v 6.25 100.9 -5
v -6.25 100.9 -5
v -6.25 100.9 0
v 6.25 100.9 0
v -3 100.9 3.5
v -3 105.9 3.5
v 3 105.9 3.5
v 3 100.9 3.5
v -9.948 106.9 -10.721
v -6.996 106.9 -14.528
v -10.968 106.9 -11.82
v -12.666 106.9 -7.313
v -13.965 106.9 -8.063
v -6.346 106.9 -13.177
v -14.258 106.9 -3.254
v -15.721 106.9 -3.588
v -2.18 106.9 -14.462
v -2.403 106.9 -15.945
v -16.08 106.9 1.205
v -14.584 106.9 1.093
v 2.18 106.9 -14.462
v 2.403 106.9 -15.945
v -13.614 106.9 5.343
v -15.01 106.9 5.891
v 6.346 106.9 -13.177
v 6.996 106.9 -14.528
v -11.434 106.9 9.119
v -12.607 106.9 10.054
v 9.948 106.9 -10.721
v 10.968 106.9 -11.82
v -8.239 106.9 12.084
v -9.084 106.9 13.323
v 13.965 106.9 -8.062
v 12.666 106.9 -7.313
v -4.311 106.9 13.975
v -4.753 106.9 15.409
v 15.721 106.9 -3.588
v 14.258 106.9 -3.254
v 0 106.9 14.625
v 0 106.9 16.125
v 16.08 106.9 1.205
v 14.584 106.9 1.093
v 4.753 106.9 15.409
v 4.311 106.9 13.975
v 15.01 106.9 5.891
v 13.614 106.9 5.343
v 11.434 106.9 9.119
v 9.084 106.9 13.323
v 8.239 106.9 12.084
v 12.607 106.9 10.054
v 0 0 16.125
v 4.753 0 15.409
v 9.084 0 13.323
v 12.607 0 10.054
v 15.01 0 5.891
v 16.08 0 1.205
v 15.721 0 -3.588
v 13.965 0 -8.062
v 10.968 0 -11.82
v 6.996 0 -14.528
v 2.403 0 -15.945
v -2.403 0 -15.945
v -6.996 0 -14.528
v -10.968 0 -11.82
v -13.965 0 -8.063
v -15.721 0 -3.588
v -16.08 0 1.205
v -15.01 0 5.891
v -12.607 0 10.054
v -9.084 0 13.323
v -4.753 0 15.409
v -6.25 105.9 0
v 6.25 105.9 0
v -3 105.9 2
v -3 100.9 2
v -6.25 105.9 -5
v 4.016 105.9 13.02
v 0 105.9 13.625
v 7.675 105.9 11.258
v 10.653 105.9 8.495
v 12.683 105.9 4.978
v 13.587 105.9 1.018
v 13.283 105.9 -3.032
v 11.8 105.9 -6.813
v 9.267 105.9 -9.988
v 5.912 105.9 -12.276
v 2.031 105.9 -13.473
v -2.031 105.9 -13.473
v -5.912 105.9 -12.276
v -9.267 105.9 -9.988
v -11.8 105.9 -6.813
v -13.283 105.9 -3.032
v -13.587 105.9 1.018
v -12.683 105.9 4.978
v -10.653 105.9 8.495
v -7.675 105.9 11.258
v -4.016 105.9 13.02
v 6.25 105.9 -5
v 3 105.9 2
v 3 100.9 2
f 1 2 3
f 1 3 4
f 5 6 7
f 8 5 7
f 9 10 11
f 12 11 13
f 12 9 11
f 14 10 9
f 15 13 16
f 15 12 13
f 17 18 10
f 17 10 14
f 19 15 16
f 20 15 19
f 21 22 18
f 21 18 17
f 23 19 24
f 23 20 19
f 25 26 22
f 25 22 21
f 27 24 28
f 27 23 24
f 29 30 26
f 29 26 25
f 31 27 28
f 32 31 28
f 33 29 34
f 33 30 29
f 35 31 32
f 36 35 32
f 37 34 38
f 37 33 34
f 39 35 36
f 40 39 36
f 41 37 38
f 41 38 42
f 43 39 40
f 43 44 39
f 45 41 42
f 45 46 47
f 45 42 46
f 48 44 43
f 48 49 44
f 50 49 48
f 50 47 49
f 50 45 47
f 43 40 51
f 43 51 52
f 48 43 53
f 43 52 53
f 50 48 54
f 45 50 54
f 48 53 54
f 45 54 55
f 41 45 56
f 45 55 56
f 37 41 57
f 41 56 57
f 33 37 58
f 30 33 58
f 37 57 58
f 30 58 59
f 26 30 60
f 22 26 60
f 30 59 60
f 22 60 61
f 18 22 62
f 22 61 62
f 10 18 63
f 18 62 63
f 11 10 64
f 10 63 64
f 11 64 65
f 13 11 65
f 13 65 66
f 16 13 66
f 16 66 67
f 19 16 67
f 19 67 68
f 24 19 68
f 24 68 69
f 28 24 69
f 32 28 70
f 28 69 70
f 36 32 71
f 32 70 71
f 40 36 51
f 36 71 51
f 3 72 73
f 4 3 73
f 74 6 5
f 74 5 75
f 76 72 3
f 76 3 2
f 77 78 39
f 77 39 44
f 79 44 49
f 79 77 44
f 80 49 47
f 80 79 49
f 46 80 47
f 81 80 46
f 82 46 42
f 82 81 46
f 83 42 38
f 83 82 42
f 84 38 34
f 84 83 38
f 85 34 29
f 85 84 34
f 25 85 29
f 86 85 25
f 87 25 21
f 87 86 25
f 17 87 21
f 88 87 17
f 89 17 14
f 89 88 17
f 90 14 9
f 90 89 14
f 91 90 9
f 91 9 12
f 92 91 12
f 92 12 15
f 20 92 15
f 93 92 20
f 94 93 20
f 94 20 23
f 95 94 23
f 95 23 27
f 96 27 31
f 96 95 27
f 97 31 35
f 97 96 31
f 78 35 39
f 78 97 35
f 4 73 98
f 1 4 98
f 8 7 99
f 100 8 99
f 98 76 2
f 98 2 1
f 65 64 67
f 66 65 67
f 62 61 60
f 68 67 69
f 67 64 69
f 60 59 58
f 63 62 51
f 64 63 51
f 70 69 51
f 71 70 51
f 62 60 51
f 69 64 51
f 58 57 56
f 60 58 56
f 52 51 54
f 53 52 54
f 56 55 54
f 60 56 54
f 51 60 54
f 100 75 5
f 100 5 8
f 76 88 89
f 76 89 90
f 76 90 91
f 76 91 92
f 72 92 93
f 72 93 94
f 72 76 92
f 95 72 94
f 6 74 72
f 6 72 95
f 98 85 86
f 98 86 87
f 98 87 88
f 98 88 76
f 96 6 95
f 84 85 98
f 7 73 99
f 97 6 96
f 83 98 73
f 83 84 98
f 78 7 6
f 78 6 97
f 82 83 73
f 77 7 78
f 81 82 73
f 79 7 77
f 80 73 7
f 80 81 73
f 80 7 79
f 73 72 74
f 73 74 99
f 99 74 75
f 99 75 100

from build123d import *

# Parameters (mm, degrees)
SKETCH1_R           = 16.125
BOSS_EXTRUDE1_DEPTH = 106.9
SKETCH2_R           = 14.625
CUT_EXTRUDE1_DEPTH  = 1
CHAMFER1_SIZE       = 1
SKETCH3_W           = 12.5
SKETCH3_H           = 5
SKETCH3_W_2         = 6
SKETCH3_H_2         = 1.5
CUT_EXTRUDE2_DEPTH  = 5


with BuildPart() as part:
    # Sketch1 → Boss-Extrude1 (new body)
    with BuildSketch(Plane(origin=(0, 0, 0), x_dir=(1, 0, 0), z_dir=(0, 1, 0))):
        with Locations(Location((0, 0, 0), (0, 0, 270))):
            Circle(SKETCH1_R)
    extrude(amount=BOSS_EXTRUDE1_DEPTH)

    # Sketch2 → Cut-Extrude1 (cut)
    with BuildSketch(Plane(origin=(0, 106.9, 0), x_dir=(1, 0, 0), z_dir=(0, 1, 0))):
        with Locations(Location((0, 0, 0), (0, 0, 270))):
            Circle(SKETCH2_R)
    extrude(amount=-CUT_EXTRUDE1_DEPTH, mode=Mode.SUBTRACT)

    # Chamfer1
    chamfer1_edges = [part.edges().sort_by_distance(p)[0] for p in [
        (0, 105.9, -14.625),
    ]]
    chamfer(chamfer1_edges, length=CHAMFER1_SIZE - 0.0001)  # a hair under: the kernel refuses the full size

    # Sketch3 → Cut-Extrude2 (cut)
    with BuildSketch(Plane(origin=(0, 105.9, 0), x_dir=(1, 0, 0), z_dir=(0, 1, 0))):
        with Locations((0, 2.5)):
            Rectangle(SKETCH3_W, SKETCH3_H)
        with Locations((0, -2.75)):
            Rectangle(SKETCH3_W_2, SKETCH3_H_2)
    extrude(amount=-CUT_EXTRUDE2_DEPTH, mode=Mode.SUBTRACT)


solid = part.part
